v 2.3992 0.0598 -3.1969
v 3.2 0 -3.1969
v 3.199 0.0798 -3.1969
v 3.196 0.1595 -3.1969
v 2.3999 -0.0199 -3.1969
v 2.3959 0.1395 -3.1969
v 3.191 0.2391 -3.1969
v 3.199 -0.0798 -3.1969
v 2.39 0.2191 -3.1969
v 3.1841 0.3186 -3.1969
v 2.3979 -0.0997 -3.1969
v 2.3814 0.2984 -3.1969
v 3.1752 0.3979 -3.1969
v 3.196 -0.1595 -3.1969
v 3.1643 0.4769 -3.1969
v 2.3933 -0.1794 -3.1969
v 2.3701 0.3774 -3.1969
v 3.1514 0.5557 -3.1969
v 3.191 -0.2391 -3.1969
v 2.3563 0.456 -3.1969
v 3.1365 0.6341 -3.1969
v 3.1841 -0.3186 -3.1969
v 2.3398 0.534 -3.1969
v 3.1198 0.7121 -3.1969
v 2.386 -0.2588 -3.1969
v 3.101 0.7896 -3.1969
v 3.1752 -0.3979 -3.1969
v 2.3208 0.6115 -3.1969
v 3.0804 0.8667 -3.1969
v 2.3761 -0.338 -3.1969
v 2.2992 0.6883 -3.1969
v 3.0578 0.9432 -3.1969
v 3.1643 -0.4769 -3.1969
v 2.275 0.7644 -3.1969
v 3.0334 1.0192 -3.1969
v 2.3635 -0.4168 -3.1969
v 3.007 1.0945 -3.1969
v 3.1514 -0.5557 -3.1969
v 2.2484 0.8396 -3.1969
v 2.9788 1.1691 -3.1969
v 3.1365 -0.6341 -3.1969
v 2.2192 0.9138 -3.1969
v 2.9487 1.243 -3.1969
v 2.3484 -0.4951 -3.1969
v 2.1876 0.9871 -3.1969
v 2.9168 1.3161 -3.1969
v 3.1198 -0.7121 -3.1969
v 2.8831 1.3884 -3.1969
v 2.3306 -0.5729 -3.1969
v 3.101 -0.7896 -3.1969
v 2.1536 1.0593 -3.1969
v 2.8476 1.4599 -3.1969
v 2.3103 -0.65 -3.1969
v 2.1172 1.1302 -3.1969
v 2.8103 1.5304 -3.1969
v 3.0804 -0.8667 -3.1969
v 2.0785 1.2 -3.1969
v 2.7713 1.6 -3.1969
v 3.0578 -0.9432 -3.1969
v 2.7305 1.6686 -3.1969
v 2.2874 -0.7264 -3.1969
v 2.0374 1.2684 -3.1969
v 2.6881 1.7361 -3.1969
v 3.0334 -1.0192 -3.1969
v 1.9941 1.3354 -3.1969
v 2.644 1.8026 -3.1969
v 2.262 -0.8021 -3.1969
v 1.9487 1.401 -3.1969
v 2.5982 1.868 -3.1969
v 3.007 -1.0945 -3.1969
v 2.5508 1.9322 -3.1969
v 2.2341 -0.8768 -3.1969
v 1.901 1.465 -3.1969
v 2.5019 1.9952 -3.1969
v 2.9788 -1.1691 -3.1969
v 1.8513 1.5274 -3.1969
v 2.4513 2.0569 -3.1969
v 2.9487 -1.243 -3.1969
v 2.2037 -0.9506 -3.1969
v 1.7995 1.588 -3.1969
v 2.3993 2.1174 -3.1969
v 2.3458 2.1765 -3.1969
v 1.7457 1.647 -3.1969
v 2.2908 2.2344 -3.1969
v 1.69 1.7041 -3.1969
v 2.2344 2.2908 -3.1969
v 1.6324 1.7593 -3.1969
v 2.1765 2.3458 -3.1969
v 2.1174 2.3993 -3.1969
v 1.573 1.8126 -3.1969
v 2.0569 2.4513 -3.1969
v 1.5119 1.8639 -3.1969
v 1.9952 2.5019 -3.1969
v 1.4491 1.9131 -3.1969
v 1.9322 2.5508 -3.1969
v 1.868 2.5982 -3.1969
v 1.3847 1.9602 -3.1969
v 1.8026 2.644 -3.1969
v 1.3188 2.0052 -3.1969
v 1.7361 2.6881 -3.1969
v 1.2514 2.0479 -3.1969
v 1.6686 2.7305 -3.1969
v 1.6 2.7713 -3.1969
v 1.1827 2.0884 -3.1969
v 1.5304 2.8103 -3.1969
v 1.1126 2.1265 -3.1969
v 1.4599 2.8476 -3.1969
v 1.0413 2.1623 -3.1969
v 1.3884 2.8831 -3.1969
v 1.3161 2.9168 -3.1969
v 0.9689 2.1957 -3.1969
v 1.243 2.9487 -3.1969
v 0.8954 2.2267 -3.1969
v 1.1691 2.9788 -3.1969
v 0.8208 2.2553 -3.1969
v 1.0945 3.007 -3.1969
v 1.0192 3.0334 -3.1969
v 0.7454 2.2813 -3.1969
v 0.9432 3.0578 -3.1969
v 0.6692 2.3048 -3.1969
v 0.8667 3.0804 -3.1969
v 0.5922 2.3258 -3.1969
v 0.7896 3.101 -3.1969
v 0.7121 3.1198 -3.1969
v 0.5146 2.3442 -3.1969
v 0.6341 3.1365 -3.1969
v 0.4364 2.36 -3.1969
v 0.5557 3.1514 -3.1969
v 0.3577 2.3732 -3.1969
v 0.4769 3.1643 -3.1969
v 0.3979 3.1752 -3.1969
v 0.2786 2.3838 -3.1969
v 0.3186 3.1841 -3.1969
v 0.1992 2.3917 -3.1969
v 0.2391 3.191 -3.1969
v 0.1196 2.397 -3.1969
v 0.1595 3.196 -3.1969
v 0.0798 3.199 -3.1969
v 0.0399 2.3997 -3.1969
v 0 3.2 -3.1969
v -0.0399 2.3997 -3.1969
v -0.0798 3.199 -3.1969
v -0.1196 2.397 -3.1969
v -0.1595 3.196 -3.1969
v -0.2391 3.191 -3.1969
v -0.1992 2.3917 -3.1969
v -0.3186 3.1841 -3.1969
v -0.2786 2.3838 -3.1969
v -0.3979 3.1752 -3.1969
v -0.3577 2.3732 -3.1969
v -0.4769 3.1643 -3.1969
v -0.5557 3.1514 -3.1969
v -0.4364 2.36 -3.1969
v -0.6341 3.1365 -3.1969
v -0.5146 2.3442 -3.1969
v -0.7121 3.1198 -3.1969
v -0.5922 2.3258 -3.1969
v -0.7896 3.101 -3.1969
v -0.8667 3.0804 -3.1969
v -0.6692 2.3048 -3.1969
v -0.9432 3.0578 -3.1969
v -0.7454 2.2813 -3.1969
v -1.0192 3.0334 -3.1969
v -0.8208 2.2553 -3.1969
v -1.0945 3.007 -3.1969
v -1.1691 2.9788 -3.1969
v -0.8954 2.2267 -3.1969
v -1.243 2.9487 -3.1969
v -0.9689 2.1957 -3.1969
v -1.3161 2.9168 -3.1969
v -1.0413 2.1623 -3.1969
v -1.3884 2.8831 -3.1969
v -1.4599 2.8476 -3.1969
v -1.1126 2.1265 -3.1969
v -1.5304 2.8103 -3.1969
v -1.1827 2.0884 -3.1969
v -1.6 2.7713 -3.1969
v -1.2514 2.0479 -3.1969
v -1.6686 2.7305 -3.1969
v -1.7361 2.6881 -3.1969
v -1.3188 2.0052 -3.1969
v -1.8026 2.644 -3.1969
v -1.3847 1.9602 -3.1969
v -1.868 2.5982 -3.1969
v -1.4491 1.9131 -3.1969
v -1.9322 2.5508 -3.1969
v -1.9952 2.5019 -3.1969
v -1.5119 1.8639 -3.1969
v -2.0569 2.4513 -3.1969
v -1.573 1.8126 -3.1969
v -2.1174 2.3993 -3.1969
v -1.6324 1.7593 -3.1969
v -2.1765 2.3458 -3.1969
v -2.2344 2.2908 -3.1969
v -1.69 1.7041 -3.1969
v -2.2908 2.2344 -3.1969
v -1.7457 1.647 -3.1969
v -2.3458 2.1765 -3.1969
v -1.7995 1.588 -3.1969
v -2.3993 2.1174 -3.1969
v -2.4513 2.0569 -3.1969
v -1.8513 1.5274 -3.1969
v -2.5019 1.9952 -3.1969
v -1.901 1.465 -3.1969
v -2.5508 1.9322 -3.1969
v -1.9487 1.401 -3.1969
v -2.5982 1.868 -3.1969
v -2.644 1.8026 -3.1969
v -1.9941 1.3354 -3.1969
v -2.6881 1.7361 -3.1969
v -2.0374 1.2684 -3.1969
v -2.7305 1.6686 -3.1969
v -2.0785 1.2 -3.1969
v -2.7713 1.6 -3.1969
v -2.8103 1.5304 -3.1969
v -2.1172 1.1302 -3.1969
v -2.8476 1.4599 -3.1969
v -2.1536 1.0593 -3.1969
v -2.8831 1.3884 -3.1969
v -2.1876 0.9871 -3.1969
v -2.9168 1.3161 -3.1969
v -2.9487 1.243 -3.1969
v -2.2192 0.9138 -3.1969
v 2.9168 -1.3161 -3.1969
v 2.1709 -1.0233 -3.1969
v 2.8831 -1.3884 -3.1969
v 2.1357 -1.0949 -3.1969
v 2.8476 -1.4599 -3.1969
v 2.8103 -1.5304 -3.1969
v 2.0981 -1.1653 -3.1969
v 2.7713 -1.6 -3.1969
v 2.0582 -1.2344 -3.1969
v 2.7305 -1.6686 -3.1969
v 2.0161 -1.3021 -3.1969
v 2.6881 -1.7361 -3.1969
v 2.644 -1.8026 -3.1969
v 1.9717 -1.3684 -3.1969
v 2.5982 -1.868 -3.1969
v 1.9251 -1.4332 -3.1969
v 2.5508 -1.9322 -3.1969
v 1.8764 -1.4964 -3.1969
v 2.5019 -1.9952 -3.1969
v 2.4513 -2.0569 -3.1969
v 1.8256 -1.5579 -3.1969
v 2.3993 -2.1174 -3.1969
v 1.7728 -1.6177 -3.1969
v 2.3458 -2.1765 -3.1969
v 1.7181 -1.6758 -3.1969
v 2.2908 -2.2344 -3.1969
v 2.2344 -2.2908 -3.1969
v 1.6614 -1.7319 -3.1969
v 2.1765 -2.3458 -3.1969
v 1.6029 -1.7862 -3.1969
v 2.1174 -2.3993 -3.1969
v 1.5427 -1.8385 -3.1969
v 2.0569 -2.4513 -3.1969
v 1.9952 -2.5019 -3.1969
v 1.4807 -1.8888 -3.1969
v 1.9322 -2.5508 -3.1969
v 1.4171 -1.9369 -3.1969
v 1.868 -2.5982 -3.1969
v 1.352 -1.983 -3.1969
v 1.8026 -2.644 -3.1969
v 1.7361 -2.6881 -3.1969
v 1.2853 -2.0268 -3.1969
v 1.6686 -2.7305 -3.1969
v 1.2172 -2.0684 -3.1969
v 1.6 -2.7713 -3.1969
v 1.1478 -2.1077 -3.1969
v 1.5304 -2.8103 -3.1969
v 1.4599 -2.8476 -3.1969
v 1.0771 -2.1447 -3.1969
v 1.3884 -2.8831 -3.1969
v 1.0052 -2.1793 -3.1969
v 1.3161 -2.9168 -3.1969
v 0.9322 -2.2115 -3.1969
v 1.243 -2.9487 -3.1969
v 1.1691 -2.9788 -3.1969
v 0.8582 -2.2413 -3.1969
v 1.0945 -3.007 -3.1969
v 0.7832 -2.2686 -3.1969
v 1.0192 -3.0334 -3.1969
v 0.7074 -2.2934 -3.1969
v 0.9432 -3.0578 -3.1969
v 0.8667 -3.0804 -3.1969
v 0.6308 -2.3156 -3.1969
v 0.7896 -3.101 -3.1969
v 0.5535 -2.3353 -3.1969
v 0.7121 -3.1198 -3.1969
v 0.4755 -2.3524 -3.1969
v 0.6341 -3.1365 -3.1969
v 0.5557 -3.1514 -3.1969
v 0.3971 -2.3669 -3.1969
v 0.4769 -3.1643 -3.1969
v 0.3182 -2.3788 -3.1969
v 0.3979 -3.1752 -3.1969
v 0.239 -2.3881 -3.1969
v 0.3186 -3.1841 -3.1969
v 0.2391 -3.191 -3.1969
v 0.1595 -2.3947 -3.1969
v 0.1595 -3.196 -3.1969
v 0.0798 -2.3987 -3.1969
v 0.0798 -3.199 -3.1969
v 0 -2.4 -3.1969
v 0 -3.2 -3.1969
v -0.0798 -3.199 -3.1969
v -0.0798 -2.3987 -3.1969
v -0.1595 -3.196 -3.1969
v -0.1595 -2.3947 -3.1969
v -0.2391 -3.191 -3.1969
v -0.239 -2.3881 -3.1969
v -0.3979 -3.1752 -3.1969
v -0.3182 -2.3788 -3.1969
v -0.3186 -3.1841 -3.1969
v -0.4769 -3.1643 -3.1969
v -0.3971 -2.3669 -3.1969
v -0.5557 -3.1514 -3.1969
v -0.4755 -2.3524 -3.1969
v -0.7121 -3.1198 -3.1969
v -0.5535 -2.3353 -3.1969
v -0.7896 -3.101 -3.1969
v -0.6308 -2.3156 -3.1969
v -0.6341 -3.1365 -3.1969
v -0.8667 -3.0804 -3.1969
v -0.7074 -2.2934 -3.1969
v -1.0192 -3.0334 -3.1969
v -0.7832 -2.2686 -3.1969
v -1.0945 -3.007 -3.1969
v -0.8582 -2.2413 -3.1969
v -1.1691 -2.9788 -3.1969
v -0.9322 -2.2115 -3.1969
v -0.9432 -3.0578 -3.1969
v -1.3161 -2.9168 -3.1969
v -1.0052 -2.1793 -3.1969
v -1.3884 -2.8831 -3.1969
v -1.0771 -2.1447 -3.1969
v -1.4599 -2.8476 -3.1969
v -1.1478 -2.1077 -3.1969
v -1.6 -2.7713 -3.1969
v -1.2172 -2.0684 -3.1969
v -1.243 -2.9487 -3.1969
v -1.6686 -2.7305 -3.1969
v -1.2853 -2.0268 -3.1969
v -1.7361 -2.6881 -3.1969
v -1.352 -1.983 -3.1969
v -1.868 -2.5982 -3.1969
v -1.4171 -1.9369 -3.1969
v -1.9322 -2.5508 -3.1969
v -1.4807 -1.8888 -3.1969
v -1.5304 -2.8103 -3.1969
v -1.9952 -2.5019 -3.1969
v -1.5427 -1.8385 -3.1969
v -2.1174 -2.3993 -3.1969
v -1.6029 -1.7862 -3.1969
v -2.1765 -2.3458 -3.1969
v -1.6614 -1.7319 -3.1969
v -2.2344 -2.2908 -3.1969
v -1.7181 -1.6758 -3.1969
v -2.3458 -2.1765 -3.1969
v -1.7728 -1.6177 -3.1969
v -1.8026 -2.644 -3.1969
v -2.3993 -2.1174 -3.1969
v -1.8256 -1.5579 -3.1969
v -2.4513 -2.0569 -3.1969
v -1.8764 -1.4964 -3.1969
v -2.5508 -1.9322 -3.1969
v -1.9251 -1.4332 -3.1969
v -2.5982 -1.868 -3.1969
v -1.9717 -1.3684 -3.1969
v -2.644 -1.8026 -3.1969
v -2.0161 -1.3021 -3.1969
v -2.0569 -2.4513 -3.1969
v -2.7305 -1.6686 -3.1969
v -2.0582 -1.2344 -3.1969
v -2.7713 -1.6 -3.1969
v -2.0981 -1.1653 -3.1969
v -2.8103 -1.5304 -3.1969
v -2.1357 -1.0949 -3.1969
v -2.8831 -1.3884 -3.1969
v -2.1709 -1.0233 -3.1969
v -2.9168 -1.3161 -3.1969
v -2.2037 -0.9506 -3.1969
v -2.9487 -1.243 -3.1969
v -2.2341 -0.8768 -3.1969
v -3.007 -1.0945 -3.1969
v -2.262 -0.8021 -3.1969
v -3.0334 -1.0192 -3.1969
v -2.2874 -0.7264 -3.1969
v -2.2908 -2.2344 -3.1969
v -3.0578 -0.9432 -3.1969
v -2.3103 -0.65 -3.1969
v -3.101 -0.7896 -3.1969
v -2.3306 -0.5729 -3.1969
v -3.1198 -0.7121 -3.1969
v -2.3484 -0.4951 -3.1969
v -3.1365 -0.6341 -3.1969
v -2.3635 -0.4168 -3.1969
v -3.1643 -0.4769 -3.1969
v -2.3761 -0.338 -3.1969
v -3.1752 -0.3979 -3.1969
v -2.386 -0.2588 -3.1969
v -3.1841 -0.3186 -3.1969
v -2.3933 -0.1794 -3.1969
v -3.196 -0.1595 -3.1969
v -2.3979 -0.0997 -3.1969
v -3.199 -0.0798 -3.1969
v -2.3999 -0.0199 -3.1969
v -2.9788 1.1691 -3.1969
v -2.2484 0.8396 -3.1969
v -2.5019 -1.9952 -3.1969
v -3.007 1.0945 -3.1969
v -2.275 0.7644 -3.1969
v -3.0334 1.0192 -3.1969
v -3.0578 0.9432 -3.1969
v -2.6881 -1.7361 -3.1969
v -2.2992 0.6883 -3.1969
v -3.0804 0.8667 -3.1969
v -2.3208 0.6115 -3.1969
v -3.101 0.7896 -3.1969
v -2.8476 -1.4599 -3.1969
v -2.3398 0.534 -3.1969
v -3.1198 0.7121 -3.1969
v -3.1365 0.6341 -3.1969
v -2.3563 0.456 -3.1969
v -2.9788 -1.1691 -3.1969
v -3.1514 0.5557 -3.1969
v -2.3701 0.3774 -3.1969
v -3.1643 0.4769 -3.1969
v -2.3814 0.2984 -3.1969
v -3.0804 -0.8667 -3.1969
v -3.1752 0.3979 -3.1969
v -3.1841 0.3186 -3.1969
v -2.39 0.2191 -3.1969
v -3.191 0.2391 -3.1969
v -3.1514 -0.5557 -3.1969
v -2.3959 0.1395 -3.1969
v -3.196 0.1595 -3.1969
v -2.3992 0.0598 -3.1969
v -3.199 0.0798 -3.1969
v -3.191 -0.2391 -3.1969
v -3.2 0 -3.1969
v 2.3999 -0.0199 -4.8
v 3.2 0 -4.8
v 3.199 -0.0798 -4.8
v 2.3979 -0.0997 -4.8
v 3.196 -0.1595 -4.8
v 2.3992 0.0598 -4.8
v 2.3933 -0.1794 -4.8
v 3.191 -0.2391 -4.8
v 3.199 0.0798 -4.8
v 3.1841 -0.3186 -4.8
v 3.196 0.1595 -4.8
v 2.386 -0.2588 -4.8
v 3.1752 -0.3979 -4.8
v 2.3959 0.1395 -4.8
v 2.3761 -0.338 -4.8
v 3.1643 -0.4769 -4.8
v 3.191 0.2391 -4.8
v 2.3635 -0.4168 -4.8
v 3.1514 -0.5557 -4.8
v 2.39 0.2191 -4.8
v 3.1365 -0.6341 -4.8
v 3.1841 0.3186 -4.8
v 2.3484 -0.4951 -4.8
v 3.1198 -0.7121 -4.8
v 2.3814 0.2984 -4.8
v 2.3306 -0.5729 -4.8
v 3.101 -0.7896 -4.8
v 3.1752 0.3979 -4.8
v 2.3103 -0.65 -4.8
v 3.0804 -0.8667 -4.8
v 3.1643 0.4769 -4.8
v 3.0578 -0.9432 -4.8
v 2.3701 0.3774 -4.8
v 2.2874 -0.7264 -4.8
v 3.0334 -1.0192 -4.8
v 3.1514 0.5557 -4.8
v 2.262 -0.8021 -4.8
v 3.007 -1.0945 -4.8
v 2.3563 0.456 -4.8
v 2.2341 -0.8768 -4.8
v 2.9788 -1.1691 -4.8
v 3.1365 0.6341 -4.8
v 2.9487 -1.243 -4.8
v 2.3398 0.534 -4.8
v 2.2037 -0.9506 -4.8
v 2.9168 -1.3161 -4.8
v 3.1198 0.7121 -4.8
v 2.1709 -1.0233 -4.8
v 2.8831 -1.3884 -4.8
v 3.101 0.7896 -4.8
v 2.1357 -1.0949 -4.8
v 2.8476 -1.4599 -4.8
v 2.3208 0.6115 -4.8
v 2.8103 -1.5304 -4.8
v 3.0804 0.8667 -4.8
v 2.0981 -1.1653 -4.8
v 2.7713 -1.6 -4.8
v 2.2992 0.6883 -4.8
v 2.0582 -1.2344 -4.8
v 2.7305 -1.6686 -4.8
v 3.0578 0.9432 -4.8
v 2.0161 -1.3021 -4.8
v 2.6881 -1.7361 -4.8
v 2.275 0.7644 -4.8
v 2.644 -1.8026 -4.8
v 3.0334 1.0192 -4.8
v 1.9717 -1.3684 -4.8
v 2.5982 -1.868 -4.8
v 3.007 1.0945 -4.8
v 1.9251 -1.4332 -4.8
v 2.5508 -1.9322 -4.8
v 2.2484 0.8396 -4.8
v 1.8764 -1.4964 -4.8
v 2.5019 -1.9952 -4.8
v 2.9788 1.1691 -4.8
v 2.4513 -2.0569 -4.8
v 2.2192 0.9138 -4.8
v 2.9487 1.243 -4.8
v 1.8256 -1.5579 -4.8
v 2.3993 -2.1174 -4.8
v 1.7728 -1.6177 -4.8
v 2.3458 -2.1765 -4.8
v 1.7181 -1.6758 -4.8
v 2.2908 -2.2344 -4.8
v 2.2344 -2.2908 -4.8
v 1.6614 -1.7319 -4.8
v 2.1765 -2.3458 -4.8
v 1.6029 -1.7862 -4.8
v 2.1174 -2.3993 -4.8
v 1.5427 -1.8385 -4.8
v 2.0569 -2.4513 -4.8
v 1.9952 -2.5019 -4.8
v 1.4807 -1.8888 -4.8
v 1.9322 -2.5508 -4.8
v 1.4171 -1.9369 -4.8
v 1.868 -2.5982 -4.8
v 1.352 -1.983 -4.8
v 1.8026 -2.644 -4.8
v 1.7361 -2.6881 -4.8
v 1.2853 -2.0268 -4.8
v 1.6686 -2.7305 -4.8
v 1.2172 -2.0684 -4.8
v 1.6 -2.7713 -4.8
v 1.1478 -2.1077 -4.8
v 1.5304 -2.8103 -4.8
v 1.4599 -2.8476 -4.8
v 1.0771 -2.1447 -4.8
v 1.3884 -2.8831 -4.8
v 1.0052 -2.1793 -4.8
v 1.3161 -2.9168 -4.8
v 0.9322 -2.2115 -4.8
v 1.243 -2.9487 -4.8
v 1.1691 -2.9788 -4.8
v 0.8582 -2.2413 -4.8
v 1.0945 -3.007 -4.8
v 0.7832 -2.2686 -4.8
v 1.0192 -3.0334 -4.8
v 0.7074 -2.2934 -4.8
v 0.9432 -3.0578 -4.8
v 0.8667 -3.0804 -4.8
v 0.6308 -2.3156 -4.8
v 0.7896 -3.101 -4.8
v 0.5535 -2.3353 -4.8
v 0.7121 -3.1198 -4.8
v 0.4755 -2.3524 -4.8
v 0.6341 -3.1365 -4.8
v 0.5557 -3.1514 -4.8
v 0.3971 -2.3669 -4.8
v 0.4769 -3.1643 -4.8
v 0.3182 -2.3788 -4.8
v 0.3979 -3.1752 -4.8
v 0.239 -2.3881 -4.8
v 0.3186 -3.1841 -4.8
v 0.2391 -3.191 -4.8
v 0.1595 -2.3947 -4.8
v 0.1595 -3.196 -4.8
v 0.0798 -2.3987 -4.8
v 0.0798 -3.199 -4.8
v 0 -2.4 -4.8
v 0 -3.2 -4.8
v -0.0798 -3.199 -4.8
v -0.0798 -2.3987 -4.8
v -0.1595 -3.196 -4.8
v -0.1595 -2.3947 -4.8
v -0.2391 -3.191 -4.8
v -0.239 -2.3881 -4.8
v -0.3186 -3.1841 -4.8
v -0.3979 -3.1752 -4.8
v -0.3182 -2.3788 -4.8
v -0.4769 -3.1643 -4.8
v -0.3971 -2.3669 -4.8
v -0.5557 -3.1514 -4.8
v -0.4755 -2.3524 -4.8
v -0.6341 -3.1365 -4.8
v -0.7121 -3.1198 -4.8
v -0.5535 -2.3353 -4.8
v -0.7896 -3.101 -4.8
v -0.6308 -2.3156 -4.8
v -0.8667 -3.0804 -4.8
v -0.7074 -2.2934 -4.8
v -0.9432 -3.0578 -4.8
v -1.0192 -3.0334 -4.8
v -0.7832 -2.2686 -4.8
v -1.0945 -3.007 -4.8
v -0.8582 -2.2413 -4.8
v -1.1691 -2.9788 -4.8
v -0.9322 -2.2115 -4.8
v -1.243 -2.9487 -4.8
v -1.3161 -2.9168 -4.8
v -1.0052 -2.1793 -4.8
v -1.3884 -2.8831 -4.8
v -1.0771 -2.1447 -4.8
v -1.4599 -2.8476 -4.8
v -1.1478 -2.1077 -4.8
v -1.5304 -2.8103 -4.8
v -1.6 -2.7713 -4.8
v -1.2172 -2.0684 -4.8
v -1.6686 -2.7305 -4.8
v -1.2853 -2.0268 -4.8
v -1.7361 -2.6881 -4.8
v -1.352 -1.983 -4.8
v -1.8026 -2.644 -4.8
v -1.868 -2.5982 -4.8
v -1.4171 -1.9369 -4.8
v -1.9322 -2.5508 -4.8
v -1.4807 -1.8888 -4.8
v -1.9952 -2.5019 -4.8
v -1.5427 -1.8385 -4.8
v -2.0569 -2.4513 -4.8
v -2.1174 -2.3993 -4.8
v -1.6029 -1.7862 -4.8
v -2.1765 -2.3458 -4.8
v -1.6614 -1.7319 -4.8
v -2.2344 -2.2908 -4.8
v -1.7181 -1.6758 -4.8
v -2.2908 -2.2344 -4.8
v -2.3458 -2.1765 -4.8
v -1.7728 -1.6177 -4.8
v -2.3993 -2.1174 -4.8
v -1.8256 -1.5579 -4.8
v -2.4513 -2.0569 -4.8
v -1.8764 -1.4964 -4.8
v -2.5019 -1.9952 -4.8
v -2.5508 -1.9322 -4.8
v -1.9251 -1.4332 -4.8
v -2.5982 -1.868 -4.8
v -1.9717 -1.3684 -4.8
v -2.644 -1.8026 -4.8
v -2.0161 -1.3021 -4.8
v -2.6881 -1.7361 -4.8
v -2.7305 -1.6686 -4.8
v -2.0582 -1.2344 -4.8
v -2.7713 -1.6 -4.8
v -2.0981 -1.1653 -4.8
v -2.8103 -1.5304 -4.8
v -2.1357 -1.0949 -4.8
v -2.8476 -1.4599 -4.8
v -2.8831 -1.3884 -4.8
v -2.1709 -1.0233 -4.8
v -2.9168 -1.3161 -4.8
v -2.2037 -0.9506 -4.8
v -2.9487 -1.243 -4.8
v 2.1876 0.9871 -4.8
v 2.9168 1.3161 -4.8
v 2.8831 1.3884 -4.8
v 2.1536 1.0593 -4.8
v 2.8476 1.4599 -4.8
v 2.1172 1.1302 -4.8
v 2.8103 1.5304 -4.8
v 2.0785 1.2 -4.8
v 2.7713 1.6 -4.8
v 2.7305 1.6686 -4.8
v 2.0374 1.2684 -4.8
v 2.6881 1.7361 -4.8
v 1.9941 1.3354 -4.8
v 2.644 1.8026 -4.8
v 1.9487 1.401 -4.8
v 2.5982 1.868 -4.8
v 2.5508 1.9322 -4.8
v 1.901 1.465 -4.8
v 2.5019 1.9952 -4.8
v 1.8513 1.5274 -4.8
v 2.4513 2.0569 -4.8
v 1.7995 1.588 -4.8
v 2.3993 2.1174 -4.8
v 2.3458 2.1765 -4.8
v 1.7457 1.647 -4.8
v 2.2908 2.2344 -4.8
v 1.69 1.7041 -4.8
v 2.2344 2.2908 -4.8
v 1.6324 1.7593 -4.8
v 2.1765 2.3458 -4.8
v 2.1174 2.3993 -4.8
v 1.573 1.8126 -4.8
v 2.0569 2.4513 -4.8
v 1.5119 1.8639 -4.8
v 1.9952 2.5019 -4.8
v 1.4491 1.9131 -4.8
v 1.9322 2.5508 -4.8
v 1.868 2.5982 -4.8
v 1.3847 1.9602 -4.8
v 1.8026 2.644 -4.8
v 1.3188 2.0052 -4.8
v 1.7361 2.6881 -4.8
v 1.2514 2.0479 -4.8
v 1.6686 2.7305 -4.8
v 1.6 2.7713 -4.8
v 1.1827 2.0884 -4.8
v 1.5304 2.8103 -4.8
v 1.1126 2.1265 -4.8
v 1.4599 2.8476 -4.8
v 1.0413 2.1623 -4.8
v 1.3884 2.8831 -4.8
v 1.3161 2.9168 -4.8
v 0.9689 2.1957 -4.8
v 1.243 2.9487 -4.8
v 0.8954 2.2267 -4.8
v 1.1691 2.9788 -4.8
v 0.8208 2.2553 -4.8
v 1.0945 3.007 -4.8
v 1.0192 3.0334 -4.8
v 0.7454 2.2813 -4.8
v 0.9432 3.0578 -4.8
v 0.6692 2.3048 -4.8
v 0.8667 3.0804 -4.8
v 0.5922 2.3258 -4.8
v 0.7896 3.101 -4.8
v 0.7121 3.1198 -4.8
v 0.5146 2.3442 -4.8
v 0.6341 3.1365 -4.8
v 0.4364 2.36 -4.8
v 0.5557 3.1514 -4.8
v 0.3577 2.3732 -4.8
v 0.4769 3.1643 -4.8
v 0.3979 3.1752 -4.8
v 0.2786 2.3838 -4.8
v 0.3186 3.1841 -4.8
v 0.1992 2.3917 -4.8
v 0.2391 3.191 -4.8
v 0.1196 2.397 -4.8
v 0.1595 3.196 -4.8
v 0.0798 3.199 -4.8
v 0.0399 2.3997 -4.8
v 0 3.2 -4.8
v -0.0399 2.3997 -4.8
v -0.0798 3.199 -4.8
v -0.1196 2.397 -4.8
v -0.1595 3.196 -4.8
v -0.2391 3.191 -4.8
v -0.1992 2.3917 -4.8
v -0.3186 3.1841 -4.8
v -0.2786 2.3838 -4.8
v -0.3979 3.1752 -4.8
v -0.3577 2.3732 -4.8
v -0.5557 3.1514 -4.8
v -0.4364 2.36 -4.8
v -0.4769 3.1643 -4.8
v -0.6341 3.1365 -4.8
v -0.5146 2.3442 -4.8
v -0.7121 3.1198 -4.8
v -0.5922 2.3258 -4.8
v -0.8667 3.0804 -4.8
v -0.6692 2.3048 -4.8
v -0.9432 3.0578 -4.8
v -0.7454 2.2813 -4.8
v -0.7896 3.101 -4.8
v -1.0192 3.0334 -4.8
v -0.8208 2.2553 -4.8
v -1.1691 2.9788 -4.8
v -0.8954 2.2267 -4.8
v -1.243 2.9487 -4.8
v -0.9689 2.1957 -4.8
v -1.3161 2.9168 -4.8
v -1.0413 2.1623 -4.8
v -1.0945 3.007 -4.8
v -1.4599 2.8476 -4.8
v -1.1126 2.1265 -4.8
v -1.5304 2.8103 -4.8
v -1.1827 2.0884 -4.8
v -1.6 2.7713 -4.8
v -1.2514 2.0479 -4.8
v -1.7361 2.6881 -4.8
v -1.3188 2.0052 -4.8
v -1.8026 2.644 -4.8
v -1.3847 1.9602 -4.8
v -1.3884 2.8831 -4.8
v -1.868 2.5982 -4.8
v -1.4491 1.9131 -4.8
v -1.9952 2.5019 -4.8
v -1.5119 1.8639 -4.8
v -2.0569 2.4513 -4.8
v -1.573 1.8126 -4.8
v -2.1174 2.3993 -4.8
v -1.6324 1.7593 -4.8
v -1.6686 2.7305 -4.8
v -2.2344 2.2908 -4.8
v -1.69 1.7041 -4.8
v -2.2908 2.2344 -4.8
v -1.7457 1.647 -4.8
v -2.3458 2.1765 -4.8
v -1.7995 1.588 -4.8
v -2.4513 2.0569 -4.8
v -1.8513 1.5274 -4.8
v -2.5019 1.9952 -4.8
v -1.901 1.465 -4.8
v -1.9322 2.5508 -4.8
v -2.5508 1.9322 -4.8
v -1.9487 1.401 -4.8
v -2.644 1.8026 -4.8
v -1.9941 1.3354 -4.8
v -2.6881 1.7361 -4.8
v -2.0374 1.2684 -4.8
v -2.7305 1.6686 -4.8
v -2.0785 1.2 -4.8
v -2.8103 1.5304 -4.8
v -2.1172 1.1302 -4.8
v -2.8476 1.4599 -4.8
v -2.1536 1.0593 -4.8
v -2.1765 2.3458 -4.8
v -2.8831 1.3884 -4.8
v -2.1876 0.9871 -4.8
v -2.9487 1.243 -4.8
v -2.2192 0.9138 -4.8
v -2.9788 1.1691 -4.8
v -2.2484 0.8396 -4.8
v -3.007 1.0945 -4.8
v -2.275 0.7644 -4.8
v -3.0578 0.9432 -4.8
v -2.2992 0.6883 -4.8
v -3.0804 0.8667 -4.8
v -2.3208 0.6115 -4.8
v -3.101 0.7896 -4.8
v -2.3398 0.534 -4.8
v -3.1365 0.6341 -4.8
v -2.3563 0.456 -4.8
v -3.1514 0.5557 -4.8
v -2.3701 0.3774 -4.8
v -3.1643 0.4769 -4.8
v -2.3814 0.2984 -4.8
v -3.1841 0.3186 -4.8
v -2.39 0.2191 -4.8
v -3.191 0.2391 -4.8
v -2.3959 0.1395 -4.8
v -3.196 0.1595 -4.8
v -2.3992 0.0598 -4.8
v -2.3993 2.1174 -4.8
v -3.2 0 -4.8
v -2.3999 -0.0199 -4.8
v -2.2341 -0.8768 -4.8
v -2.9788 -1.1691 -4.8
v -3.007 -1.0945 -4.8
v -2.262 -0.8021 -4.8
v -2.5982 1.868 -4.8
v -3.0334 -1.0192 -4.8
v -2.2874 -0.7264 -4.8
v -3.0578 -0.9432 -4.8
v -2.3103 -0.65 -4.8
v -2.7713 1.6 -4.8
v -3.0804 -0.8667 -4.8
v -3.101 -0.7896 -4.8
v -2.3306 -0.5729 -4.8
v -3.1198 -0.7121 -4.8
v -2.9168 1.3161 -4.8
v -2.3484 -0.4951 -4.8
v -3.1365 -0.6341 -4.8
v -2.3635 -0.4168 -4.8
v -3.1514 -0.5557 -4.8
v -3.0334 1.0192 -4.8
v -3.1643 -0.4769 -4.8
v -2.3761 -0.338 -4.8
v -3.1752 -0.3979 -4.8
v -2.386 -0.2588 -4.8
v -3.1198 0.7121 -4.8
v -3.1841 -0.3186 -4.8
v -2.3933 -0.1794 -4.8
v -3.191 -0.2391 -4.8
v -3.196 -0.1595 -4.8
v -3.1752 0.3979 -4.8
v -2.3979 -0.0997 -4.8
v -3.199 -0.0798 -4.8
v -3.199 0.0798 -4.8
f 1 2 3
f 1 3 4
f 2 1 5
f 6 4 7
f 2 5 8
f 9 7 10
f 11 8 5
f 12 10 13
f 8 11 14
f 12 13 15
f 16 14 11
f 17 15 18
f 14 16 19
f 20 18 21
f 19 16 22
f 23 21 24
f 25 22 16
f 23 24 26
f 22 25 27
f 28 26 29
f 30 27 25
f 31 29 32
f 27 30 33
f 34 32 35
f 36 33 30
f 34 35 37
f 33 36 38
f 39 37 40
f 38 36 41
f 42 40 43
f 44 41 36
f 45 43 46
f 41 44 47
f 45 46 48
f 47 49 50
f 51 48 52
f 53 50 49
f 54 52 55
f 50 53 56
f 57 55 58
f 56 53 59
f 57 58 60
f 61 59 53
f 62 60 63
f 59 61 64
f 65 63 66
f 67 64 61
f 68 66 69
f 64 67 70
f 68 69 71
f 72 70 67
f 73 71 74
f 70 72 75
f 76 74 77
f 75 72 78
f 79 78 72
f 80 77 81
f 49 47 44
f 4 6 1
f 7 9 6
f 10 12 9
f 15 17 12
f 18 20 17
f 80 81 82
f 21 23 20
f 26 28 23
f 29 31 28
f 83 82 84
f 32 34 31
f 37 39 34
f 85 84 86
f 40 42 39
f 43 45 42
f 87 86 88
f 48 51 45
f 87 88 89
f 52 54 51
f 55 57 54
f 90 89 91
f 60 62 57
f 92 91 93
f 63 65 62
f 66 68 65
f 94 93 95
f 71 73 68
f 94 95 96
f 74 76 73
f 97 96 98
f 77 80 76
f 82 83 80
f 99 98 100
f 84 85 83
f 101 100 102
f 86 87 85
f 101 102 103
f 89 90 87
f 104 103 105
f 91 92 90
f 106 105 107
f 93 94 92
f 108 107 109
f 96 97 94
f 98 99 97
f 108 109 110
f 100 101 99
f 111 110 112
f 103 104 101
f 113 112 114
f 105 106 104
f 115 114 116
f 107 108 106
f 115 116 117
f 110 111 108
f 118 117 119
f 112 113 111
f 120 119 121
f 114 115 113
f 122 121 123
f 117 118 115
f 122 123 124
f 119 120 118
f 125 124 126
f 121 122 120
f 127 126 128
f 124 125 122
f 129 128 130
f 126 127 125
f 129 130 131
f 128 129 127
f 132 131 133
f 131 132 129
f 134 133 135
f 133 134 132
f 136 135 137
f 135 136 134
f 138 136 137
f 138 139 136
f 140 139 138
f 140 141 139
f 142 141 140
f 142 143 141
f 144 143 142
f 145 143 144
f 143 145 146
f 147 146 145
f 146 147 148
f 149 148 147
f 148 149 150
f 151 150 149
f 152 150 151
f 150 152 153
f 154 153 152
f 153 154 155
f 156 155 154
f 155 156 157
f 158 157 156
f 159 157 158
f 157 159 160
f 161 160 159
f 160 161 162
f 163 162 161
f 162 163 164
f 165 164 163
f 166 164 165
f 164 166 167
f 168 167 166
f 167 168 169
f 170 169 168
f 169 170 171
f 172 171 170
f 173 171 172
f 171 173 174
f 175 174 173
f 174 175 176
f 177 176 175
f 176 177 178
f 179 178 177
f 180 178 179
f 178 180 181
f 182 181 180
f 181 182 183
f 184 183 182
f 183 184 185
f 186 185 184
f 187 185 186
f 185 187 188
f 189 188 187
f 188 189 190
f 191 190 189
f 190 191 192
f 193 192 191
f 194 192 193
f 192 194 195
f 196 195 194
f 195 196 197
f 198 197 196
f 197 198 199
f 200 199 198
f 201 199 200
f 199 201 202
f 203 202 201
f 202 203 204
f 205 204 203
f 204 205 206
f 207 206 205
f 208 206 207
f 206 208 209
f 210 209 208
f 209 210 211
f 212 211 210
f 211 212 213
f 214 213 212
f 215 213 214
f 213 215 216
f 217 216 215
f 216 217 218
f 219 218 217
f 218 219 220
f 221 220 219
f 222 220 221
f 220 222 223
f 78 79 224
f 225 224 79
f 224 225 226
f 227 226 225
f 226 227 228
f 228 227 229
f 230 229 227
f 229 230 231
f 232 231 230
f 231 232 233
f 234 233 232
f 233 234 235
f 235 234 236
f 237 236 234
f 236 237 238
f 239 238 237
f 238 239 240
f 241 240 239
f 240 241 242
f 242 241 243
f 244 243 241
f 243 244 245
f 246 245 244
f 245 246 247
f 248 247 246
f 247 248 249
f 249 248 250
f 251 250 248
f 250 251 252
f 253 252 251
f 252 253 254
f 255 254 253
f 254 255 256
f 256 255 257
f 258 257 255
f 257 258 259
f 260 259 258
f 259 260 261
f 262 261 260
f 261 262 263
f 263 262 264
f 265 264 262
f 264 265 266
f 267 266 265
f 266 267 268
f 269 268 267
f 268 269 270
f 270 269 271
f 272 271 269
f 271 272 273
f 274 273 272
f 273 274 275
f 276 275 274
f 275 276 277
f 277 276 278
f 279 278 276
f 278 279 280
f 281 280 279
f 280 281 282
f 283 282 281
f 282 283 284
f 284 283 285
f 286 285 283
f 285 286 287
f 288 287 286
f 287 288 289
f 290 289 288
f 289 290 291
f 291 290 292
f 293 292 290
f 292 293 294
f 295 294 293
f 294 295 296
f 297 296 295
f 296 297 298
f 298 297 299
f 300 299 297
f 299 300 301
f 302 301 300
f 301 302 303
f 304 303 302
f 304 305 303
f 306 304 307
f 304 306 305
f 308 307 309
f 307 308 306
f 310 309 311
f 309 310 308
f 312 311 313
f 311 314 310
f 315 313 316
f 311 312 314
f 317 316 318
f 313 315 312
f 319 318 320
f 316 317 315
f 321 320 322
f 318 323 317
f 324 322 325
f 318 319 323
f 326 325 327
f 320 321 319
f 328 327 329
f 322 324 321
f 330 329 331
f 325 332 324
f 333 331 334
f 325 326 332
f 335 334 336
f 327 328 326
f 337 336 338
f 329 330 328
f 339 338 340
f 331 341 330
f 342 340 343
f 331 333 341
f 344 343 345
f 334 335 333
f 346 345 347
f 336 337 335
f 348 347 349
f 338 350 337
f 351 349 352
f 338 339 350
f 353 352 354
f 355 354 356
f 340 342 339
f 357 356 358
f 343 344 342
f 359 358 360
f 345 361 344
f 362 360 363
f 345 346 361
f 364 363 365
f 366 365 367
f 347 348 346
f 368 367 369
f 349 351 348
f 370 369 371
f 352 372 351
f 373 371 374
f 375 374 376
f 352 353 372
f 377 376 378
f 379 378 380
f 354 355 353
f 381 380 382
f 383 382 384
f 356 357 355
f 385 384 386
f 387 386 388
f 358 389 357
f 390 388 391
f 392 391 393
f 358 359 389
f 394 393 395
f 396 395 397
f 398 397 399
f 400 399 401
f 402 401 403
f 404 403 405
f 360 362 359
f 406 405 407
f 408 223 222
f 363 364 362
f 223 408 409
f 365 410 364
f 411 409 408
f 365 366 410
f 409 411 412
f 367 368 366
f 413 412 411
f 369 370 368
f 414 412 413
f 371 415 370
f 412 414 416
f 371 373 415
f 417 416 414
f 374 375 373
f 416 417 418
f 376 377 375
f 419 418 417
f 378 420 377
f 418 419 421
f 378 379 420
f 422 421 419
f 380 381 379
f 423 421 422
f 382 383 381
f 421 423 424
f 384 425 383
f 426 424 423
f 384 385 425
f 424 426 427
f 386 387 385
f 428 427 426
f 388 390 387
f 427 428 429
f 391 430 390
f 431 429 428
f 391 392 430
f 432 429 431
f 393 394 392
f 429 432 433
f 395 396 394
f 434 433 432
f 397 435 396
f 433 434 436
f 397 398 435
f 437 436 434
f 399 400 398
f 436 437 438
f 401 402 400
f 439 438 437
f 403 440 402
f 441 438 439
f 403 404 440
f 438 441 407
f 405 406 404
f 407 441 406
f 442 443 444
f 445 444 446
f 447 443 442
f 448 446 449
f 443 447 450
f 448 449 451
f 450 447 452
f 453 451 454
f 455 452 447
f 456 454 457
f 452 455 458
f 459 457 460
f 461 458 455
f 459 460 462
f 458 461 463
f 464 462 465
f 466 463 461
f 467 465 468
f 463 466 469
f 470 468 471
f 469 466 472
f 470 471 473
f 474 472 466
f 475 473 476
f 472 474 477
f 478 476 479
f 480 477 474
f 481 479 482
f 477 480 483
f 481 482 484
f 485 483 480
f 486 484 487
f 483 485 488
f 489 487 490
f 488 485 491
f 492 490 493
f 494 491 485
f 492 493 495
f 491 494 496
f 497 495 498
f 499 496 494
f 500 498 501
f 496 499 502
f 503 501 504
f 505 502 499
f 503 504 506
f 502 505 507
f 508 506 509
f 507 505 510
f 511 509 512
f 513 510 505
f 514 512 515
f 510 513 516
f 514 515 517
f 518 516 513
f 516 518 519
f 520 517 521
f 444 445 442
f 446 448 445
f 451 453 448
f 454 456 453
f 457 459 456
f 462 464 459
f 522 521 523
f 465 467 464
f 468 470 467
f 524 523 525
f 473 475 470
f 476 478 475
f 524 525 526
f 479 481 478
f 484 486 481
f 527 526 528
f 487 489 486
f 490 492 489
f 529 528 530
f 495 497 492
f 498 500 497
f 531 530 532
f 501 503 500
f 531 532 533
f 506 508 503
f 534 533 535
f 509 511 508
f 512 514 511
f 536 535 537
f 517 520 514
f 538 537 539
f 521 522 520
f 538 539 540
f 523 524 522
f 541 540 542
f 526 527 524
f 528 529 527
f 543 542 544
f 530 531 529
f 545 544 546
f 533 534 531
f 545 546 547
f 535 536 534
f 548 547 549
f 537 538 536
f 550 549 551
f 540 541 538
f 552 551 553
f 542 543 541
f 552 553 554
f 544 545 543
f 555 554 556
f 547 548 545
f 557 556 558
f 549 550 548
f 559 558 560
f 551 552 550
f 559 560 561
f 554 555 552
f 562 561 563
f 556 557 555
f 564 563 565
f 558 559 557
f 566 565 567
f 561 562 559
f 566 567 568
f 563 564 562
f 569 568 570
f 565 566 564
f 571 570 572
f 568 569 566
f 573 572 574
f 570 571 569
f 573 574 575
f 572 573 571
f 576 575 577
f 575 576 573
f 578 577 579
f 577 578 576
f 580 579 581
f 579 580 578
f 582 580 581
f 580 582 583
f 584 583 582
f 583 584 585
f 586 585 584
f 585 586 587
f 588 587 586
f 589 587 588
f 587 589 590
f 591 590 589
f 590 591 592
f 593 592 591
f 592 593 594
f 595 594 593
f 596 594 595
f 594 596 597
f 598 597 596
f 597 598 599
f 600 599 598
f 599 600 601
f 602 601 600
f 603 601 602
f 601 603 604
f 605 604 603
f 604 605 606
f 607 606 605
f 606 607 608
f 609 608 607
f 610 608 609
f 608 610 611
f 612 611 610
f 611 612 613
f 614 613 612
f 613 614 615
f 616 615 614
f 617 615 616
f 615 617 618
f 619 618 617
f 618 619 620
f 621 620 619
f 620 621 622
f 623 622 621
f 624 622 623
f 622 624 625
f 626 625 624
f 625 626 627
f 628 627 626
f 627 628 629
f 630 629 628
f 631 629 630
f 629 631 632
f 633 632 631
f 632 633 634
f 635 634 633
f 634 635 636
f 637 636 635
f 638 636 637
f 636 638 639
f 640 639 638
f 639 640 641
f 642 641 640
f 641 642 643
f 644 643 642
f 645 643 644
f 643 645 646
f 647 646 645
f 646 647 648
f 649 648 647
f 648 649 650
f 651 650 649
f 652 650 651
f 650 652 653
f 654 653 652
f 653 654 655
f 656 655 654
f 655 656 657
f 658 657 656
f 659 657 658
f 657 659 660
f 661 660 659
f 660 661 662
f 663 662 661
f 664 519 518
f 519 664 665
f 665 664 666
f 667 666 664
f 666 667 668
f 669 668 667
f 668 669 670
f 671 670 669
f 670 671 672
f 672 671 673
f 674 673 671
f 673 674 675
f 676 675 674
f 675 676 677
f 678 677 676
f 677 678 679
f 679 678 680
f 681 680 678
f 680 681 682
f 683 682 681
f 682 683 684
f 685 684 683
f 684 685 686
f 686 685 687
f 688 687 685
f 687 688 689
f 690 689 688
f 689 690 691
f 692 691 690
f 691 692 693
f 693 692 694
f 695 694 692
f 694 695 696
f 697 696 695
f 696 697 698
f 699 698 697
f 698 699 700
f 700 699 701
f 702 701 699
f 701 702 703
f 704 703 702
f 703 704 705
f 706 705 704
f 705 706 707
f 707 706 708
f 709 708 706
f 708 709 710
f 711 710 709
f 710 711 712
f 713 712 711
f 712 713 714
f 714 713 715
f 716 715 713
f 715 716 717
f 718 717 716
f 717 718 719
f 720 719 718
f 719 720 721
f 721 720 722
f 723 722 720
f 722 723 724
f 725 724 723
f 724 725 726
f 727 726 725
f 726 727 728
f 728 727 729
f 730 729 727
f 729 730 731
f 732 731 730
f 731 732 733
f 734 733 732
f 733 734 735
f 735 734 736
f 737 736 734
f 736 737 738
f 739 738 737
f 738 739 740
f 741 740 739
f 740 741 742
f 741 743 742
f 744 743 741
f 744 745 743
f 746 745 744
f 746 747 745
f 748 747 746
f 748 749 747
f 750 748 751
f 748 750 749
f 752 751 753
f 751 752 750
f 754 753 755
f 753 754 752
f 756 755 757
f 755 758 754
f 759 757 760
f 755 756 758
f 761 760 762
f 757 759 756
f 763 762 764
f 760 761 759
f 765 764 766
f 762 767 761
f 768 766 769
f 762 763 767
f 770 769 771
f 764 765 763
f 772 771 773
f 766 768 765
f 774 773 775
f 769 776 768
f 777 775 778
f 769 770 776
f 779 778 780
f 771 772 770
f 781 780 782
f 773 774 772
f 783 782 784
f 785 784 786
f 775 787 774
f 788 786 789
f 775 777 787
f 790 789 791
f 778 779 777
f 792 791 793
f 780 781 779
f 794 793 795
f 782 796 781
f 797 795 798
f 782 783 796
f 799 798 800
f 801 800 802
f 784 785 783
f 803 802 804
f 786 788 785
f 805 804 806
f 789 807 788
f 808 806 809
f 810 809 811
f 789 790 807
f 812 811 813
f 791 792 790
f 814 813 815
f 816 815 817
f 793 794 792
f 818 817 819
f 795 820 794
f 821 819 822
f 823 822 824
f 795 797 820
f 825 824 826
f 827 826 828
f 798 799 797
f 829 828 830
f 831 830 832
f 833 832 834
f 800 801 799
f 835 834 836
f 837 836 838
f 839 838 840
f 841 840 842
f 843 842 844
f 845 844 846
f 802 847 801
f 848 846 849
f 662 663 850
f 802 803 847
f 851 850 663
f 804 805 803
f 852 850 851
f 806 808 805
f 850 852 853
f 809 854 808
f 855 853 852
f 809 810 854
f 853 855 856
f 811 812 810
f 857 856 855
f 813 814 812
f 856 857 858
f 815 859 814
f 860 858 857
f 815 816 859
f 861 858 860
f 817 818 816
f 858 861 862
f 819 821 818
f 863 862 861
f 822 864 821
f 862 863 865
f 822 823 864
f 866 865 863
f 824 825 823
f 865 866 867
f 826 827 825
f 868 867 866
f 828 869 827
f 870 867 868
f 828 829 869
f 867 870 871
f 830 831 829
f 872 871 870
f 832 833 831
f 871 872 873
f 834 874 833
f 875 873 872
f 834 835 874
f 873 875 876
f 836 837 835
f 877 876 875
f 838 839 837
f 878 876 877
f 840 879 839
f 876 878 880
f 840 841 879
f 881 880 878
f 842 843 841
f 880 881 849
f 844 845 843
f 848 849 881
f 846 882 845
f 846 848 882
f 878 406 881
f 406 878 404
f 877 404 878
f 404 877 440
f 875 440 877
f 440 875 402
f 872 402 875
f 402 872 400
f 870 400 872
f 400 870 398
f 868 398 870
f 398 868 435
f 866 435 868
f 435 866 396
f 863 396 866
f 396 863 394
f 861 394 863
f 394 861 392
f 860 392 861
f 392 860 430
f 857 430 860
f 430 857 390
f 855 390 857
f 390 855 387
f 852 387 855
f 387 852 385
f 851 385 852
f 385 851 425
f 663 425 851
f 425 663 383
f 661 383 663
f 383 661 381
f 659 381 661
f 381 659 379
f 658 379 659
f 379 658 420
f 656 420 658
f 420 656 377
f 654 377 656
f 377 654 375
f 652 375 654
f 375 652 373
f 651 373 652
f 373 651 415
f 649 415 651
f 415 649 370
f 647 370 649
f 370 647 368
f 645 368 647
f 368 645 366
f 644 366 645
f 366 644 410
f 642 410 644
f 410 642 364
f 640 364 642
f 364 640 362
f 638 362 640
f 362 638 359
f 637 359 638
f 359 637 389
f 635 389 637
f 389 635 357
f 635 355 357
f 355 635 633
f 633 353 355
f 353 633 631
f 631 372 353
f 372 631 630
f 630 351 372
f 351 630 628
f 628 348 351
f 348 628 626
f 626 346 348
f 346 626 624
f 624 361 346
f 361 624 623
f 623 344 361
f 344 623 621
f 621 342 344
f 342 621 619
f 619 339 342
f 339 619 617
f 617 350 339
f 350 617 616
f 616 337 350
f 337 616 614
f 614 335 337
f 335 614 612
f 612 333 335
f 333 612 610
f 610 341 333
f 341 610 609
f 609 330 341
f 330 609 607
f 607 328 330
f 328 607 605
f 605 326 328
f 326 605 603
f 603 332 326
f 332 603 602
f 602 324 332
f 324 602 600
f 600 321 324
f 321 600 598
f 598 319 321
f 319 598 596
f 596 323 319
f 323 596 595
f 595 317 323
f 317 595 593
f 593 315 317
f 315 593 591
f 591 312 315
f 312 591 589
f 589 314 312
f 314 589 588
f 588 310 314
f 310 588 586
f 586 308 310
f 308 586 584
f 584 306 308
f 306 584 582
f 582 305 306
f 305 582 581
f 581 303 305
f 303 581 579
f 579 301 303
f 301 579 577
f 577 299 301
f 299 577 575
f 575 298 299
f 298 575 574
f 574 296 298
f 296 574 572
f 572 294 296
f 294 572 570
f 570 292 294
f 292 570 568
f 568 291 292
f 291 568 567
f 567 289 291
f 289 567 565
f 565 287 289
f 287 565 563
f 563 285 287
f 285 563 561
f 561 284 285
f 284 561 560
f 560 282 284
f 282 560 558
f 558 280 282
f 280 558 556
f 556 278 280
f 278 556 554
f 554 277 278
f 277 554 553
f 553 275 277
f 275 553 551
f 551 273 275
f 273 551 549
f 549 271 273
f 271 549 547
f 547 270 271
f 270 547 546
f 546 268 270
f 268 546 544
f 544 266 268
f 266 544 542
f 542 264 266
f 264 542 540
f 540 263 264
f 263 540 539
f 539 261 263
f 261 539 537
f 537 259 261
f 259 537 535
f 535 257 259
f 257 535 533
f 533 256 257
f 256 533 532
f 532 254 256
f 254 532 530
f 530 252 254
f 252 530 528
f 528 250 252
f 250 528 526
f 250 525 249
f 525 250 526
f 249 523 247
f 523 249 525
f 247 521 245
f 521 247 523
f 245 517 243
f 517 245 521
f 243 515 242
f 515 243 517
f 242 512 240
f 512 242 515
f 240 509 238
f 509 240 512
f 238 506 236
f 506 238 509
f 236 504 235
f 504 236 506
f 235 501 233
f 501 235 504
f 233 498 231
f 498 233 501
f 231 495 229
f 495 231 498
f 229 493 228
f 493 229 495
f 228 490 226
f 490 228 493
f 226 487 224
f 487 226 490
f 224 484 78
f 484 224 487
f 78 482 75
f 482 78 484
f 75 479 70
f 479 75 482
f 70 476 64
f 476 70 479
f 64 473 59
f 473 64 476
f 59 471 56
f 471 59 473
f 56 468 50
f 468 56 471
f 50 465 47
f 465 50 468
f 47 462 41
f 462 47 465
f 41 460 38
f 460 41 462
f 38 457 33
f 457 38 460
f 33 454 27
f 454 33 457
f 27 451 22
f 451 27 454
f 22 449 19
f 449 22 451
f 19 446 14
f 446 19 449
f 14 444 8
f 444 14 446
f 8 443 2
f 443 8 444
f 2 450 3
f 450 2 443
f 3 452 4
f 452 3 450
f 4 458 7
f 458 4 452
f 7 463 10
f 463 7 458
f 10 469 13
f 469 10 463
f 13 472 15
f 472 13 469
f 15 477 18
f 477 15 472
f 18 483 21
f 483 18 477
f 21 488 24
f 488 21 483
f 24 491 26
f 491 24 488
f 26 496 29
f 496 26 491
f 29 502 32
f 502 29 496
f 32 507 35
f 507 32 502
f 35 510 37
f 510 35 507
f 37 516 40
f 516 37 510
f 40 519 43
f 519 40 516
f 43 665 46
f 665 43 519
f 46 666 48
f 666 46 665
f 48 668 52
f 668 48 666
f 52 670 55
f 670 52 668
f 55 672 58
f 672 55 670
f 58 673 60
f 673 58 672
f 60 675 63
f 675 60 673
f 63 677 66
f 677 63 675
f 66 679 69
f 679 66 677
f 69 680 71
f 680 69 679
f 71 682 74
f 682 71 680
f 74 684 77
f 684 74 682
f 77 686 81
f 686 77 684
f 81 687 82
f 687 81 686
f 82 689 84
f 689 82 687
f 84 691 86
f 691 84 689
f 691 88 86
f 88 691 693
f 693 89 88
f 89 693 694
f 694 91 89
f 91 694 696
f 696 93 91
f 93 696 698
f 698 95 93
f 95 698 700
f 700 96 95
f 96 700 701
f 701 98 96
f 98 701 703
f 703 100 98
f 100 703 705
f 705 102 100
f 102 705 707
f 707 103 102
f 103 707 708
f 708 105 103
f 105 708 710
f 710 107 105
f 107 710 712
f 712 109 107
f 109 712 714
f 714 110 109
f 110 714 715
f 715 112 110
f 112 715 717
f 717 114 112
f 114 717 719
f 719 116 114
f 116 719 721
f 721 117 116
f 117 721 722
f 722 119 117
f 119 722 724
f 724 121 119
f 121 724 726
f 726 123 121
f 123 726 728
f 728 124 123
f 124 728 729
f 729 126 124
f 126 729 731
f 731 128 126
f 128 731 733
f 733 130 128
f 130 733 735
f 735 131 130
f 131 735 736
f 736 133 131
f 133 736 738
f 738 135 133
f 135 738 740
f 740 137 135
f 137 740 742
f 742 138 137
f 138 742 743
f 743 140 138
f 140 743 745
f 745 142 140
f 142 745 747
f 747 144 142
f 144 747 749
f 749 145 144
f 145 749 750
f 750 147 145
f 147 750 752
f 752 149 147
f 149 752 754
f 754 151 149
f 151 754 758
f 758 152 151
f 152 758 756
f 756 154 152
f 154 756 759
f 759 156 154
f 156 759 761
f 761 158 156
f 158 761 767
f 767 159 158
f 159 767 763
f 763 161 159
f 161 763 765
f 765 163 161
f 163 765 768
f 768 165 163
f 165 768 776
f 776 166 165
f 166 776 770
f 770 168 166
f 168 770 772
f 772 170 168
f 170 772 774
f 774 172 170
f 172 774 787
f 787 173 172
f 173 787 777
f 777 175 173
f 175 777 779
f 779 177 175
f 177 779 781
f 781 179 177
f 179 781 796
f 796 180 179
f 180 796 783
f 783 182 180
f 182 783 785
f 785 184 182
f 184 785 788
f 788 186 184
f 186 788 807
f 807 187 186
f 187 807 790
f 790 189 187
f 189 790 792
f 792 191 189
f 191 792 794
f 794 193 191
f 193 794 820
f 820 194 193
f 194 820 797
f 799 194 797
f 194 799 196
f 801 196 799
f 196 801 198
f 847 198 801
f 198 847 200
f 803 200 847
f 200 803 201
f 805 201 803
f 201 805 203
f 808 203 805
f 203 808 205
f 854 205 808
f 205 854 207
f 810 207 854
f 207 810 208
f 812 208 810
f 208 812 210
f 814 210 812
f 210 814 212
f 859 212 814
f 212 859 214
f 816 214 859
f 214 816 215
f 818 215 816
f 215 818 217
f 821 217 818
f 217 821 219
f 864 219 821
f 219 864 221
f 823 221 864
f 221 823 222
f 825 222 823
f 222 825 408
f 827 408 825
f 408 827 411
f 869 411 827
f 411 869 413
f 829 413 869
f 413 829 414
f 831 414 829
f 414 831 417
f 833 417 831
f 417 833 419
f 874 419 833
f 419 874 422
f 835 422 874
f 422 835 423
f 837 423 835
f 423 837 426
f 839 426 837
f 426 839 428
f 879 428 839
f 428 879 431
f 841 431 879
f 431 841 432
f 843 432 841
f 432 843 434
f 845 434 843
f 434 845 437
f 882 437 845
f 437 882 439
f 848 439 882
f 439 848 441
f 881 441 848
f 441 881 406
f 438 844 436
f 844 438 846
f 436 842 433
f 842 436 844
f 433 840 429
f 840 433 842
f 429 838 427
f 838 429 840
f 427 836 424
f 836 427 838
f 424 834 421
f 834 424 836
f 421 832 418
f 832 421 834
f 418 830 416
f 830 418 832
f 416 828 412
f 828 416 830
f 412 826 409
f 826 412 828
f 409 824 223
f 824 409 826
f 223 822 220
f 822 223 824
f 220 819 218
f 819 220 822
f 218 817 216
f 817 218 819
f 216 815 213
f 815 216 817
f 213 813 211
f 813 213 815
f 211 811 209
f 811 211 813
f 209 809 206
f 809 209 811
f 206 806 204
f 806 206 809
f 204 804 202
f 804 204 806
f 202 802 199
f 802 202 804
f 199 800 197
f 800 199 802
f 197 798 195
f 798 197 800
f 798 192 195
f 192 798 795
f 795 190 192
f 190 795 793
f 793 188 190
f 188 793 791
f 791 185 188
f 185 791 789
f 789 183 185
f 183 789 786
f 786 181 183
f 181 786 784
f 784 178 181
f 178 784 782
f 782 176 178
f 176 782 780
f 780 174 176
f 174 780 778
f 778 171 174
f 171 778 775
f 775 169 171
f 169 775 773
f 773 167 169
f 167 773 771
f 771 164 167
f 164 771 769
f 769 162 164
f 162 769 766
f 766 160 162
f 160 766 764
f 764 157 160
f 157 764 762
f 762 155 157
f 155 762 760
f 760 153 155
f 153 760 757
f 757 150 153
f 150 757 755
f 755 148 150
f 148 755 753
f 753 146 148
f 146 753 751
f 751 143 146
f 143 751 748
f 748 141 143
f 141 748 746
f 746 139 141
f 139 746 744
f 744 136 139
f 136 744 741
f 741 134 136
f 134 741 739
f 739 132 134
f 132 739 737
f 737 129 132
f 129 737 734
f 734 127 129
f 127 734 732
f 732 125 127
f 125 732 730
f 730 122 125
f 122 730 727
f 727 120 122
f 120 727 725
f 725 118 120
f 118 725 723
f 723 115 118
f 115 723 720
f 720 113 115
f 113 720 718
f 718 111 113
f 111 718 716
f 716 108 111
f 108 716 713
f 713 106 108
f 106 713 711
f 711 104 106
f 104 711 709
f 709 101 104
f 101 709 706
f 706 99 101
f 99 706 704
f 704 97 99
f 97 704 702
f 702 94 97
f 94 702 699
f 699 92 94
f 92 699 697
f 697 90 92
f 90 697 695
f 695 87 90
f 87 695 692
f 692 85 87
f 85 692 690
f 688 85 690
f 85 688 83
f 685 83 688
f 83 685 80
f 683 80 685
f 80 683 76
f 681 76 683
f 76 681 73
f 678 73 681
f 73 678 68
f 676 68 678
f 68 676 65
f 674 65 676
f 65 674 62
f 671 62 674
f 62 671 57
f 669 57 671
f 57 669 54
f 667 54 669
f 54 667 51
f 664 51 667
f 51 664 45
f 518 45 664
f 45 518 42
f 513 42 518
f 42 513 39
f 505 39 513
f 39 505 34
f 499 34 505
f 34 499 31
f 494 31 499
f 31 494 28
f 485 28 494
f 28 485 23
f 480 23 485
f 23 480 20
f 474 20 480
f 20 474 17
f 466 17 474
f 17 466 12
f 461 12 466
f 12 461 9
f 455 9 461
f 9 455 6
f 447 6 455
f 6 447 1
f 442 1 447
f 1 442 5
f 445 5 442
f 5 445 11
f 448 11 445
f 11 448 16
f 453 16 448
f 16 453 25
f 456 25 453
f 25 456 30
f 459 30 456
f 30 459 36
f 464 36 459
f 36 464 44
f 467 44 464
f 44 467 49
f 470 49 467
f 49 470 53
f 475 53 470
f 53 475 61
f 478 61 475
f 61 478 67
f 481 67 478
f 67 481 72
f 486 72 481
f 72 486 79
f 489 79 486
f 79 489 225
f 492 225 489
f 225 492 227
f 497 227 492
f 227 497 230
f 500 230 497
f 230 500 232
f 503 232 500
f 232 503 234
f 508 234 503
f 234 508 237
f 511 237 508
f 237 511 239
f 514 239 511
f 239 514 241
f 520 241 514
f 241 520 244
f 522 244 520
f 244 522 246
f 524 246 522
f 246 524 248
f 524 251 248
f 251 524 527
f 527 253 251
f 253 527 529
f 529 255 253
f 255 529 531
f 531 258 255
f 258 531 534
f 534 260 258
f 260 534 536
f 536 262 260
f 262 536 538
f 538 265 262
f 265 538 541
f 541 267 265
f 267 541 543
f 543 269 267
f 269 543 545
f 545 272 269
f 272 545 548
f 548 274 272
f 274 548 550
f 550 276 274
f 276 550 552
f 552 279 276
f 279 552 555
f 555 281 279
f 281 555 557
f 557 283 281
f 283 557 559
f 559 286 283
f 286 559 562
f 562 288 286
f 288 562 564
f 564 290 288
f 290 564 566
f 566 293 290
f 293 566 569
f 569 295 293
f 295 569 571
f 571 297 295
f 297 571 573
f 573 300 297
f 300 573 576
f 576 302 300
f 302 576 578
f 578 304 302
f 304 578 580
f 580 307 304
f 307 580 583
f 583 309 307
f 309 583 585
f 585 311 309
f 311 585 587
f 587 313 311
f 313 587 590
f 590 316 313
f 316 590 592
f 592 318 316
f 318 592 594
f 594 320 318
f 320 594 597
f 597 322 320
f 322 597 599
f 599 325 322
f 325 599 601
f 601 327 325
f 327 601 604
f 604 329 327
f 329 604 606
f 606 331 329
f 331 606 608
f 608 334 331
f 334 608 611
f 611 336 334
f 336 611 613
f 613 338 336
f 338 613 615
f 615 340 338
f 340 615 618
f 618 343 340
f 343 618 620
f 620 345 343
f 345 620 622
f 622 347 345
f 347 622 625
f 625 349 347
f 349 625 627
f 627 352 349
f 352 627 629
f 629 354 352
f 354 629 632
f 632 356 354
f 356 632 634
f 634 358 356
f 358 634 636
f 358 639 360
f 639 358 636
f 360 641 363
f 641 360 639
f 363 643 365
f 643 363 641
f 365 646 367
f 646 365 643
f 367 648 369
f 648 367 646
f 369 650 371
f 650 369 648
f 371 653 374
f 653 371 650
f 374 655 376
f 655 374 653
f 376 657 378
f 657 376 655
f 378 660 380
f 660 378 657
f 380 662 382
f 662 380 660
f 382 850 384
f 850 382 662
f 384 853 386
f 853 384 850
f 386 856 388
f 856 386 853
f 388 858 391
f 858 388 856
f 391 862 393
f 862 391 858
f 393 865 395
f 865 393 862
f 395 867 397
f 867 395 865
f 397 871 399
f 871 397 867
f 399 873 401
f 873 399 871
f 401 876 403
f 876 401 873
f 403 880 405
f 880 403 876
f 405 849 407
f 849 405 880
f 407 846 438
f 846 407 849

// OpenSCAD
use <../lib.scad>
use <../p/1-4cyls2.scad>
use <../p/2-4edge.scad>
use <../p/4-4cyli.scad>
use <../p/4-4disc.scad>
use <../p/4-4edge.scad>
use <../p/4-4rin13.scad>
use <../p/4-4rin14.scad>
use <../p/stud4.scad>
$fa=1; $fs=0.2;
function ldraw_lib__4528(realsolid=false) = [
// 0 Minifig Frypan
// 0 Name: 4528.dat
// 0 Author: James Jessiman
// 0 !LDRAW_ORG Part UPDATE 2003-03
// 0 !LICENSE Licensed under CC BY 2.0 and CC BY 4.0 : see CAreadme.txt
// 
// 0 BFC CERTIFY CCW
  [0,"BFC","CERTIFY"],
  [0,"BFC","CCW"],
// 
// 0 !CATEGORY Minifig Accessory
// 0 !KEYWORDS Cookware, frying, pan, skillet, town, utensil
// 
// 0 !CMDLINE -c0
// 
// 0 !HISTORY 1998-06-20 [PTadmin] Official Update 1998-06
// 0 !HISTORY 2001-10-26 [PTadmin] Official Update 2001-01
// 0 !HISTORY 2003-06-08 [jriley] BFC compliant; ring substitutions
// 0 !HISTORY 2003-11-21 [westrate] extended handle
// 0 !HISTORY 2003-11-28 [fwcain] fixed Title; added CMDLINE (for default color)
// 0 !HISTORY 2003-12-19 [PTadmin] Official Update 2003-03
// 0 !HISTORY 2007-07-08 [PTadmin] Header formatted for Contributor Agreement
// 0 !HISTORY 2008-07-01 [PTadmin] Official Update 2008-01
// 
// 
// 1 16 0 8 0 1 0 0 0 -1 0 0 0 1 stud4.dat
  [1,16,0,8,0,1,0,0,0,-1,0,0,0,1, ldraw_lib__stud4(realsolid)],
// 1 16 0 8 0 15 0 0 0 -1 0 0 0 15 4-4edge.dat
  [1,16,0,8,0,15,0,0,0,-1,0,0,0,15, ldraw_lib__4_4edge(realsolid)],
// 1 16 0 6 0 13 0 0 0 1 0 0 0 13 4-4edge.dat
  [1,16,0,6,0,13,0,0,0,1,0,0,0,13, ldraw_lib__4_4edge(realsolid)],
// 1 16 0 0 0 13 0 0 0 1 0 0 0 13 4-4edge.dat
  [1,16,0,0,0,13,0,0,0,1,0,0,0,13, ldraw_lib__4_4edge(realsolid)],
// 1 16 0 0 0 15 0 0 0 1 0 0 0 15 4-4edge.dat
  [1,16,0,0,0,15,0,0,0,1,0,0,0,15, ldraw_lib__4_4edge(realsolid)],
// 1 16 0 4 30 4 0 0 0 0 4 0 -1 0 4-4edge.dat
  [1,16,0,4,30,4,0,0,0,0,4,0,-1,0, ldraw_lib__4_4edge(realsolid)],
// 1 16 0 8 0 15 0 0 0 -1 0 0 0 15 4-4disc.dat
  [1,16,0,8,0,15,0,0,0,-1,0,0,0,15, ldraw_lib__4_4disc(realsolid)],
// 1 16 0 6 0 13 0 0 0 1 0 0 0 13 4-4disc.dat
  [1,16,0,6,0,13,0,0,0,1,0,0,0,13, ldraw_lib__4_4disc(realsolid)],
// 1 16 0 4 30 4 0 0 0 0 4 0 -1 0 4-4disc.dat
  [1,16,0,4,30,4,0,0,0,0,4,0,-1,0, ldraw_lib__4_4disc(realsolid)],
// 1 16 0 0 0 1 0 0 0 1 0 0 0 1 4-4rin13.dat
  [1,16,0,0,0,1,0,0,0,1,0,0,0,1, ldraw_lib__4_4rin13(realsolid)],
// 1 16 0 0 0 1 0 0 0 1 0 0 0 1 4-4rin14.dat
  [1,16,0,0,0,1,0,0,0,1,0,0,0,1, ldraw_lib__4_4rin14(realsolid)],
// 0 BFC INVERTNEXT
  [0,"BFC","INVERTNEXT"],
// 1 16 0 0 0 13 0 0 0 6 0 0 0 13 4-4cyli.dat
  [1,16,0,0,0,13,0,0,0,6,0,0,0,13, ldraw_lib__4_4cyli(realsolid)],
// 1 16 0 0 0 15 0 0 0 8 0 0 0 15 4-4cyli.dat
  [1,16,0,0,0,15,0,0,0,8,0,0,0,15, ldraw_lib__4_4cyli(realsolid)],
// 1 16 0 4 15 4 0 0 0 0 4 0 15 0 4-4cyli.dat
  [1,16,0,4,15,4,0,0,0,0,4,0,15,0, ldraw_lib__4_4cyli(realsolid)],
// 1 16 0 4 15 -4 0 0 0 0 -4 0 -0.8 0 1-4cyls2.dat
  [1,16,0,4,15,-4,0,0,0,0,-4,0,-0.8,0, ldraw_lib__1_4cyls2(realsolid)],
// 1 16 0 4 15 -4 0 0 0 0 4 0 -0.8 0 1-4cyls2.dat
  [1,16,0,4,15,-4,0,0,0,0,4,0,-0.8,0, ldraw_lib__1_4cyls2(realsolid)],
// 1 16 0 4 15 0 0 4 -4 0 0 0 1 -0.8 2-4edge.dat
  [1,16,0,4,15,0,0,4,-4,0,0,0,1,-0.8, ldraw_lib__2_4edge(realsolid)],
// 1 16 0 4 15 4 0 0 0 0 -4 0 -0.8 0 1-4cyls2.dat
  [1,16,0,4,15,4,0,0,0,0,-4,0,-0.8,0, ldraw_lib__1_4cyls2(realsolid)],
// 1 16 0 4 15 4 0 0 0 0 4 0 -0.8 0 1-4cyls2.dat
  [1,16,0,4,15,4,0,0,0,0,4,0,-0.8,0, ldraw_lib__1_4cyls2(realsolid)],
// 1 16 0 4 15 0 0 -4 -4 0 0 0 1 -0.8 2-4edge.dat
  [1,16,0,4,15,0,0,-4,-4,0,0,0,1,-0.8, ldraw_lib__2_4edge(realsolid)],
// 
// 0 // end of file
];
module ldraw_lib__4528(step=0, col=false, unit=2/5, alt=false, line=0.2, solid=!$preview)
    makepoly(ldraw_lib__4528(solid), step=step, col=col, unit=unit, alt=alt, line=line, solid=solid);
ldraw_lib__4528(line=0.2);
